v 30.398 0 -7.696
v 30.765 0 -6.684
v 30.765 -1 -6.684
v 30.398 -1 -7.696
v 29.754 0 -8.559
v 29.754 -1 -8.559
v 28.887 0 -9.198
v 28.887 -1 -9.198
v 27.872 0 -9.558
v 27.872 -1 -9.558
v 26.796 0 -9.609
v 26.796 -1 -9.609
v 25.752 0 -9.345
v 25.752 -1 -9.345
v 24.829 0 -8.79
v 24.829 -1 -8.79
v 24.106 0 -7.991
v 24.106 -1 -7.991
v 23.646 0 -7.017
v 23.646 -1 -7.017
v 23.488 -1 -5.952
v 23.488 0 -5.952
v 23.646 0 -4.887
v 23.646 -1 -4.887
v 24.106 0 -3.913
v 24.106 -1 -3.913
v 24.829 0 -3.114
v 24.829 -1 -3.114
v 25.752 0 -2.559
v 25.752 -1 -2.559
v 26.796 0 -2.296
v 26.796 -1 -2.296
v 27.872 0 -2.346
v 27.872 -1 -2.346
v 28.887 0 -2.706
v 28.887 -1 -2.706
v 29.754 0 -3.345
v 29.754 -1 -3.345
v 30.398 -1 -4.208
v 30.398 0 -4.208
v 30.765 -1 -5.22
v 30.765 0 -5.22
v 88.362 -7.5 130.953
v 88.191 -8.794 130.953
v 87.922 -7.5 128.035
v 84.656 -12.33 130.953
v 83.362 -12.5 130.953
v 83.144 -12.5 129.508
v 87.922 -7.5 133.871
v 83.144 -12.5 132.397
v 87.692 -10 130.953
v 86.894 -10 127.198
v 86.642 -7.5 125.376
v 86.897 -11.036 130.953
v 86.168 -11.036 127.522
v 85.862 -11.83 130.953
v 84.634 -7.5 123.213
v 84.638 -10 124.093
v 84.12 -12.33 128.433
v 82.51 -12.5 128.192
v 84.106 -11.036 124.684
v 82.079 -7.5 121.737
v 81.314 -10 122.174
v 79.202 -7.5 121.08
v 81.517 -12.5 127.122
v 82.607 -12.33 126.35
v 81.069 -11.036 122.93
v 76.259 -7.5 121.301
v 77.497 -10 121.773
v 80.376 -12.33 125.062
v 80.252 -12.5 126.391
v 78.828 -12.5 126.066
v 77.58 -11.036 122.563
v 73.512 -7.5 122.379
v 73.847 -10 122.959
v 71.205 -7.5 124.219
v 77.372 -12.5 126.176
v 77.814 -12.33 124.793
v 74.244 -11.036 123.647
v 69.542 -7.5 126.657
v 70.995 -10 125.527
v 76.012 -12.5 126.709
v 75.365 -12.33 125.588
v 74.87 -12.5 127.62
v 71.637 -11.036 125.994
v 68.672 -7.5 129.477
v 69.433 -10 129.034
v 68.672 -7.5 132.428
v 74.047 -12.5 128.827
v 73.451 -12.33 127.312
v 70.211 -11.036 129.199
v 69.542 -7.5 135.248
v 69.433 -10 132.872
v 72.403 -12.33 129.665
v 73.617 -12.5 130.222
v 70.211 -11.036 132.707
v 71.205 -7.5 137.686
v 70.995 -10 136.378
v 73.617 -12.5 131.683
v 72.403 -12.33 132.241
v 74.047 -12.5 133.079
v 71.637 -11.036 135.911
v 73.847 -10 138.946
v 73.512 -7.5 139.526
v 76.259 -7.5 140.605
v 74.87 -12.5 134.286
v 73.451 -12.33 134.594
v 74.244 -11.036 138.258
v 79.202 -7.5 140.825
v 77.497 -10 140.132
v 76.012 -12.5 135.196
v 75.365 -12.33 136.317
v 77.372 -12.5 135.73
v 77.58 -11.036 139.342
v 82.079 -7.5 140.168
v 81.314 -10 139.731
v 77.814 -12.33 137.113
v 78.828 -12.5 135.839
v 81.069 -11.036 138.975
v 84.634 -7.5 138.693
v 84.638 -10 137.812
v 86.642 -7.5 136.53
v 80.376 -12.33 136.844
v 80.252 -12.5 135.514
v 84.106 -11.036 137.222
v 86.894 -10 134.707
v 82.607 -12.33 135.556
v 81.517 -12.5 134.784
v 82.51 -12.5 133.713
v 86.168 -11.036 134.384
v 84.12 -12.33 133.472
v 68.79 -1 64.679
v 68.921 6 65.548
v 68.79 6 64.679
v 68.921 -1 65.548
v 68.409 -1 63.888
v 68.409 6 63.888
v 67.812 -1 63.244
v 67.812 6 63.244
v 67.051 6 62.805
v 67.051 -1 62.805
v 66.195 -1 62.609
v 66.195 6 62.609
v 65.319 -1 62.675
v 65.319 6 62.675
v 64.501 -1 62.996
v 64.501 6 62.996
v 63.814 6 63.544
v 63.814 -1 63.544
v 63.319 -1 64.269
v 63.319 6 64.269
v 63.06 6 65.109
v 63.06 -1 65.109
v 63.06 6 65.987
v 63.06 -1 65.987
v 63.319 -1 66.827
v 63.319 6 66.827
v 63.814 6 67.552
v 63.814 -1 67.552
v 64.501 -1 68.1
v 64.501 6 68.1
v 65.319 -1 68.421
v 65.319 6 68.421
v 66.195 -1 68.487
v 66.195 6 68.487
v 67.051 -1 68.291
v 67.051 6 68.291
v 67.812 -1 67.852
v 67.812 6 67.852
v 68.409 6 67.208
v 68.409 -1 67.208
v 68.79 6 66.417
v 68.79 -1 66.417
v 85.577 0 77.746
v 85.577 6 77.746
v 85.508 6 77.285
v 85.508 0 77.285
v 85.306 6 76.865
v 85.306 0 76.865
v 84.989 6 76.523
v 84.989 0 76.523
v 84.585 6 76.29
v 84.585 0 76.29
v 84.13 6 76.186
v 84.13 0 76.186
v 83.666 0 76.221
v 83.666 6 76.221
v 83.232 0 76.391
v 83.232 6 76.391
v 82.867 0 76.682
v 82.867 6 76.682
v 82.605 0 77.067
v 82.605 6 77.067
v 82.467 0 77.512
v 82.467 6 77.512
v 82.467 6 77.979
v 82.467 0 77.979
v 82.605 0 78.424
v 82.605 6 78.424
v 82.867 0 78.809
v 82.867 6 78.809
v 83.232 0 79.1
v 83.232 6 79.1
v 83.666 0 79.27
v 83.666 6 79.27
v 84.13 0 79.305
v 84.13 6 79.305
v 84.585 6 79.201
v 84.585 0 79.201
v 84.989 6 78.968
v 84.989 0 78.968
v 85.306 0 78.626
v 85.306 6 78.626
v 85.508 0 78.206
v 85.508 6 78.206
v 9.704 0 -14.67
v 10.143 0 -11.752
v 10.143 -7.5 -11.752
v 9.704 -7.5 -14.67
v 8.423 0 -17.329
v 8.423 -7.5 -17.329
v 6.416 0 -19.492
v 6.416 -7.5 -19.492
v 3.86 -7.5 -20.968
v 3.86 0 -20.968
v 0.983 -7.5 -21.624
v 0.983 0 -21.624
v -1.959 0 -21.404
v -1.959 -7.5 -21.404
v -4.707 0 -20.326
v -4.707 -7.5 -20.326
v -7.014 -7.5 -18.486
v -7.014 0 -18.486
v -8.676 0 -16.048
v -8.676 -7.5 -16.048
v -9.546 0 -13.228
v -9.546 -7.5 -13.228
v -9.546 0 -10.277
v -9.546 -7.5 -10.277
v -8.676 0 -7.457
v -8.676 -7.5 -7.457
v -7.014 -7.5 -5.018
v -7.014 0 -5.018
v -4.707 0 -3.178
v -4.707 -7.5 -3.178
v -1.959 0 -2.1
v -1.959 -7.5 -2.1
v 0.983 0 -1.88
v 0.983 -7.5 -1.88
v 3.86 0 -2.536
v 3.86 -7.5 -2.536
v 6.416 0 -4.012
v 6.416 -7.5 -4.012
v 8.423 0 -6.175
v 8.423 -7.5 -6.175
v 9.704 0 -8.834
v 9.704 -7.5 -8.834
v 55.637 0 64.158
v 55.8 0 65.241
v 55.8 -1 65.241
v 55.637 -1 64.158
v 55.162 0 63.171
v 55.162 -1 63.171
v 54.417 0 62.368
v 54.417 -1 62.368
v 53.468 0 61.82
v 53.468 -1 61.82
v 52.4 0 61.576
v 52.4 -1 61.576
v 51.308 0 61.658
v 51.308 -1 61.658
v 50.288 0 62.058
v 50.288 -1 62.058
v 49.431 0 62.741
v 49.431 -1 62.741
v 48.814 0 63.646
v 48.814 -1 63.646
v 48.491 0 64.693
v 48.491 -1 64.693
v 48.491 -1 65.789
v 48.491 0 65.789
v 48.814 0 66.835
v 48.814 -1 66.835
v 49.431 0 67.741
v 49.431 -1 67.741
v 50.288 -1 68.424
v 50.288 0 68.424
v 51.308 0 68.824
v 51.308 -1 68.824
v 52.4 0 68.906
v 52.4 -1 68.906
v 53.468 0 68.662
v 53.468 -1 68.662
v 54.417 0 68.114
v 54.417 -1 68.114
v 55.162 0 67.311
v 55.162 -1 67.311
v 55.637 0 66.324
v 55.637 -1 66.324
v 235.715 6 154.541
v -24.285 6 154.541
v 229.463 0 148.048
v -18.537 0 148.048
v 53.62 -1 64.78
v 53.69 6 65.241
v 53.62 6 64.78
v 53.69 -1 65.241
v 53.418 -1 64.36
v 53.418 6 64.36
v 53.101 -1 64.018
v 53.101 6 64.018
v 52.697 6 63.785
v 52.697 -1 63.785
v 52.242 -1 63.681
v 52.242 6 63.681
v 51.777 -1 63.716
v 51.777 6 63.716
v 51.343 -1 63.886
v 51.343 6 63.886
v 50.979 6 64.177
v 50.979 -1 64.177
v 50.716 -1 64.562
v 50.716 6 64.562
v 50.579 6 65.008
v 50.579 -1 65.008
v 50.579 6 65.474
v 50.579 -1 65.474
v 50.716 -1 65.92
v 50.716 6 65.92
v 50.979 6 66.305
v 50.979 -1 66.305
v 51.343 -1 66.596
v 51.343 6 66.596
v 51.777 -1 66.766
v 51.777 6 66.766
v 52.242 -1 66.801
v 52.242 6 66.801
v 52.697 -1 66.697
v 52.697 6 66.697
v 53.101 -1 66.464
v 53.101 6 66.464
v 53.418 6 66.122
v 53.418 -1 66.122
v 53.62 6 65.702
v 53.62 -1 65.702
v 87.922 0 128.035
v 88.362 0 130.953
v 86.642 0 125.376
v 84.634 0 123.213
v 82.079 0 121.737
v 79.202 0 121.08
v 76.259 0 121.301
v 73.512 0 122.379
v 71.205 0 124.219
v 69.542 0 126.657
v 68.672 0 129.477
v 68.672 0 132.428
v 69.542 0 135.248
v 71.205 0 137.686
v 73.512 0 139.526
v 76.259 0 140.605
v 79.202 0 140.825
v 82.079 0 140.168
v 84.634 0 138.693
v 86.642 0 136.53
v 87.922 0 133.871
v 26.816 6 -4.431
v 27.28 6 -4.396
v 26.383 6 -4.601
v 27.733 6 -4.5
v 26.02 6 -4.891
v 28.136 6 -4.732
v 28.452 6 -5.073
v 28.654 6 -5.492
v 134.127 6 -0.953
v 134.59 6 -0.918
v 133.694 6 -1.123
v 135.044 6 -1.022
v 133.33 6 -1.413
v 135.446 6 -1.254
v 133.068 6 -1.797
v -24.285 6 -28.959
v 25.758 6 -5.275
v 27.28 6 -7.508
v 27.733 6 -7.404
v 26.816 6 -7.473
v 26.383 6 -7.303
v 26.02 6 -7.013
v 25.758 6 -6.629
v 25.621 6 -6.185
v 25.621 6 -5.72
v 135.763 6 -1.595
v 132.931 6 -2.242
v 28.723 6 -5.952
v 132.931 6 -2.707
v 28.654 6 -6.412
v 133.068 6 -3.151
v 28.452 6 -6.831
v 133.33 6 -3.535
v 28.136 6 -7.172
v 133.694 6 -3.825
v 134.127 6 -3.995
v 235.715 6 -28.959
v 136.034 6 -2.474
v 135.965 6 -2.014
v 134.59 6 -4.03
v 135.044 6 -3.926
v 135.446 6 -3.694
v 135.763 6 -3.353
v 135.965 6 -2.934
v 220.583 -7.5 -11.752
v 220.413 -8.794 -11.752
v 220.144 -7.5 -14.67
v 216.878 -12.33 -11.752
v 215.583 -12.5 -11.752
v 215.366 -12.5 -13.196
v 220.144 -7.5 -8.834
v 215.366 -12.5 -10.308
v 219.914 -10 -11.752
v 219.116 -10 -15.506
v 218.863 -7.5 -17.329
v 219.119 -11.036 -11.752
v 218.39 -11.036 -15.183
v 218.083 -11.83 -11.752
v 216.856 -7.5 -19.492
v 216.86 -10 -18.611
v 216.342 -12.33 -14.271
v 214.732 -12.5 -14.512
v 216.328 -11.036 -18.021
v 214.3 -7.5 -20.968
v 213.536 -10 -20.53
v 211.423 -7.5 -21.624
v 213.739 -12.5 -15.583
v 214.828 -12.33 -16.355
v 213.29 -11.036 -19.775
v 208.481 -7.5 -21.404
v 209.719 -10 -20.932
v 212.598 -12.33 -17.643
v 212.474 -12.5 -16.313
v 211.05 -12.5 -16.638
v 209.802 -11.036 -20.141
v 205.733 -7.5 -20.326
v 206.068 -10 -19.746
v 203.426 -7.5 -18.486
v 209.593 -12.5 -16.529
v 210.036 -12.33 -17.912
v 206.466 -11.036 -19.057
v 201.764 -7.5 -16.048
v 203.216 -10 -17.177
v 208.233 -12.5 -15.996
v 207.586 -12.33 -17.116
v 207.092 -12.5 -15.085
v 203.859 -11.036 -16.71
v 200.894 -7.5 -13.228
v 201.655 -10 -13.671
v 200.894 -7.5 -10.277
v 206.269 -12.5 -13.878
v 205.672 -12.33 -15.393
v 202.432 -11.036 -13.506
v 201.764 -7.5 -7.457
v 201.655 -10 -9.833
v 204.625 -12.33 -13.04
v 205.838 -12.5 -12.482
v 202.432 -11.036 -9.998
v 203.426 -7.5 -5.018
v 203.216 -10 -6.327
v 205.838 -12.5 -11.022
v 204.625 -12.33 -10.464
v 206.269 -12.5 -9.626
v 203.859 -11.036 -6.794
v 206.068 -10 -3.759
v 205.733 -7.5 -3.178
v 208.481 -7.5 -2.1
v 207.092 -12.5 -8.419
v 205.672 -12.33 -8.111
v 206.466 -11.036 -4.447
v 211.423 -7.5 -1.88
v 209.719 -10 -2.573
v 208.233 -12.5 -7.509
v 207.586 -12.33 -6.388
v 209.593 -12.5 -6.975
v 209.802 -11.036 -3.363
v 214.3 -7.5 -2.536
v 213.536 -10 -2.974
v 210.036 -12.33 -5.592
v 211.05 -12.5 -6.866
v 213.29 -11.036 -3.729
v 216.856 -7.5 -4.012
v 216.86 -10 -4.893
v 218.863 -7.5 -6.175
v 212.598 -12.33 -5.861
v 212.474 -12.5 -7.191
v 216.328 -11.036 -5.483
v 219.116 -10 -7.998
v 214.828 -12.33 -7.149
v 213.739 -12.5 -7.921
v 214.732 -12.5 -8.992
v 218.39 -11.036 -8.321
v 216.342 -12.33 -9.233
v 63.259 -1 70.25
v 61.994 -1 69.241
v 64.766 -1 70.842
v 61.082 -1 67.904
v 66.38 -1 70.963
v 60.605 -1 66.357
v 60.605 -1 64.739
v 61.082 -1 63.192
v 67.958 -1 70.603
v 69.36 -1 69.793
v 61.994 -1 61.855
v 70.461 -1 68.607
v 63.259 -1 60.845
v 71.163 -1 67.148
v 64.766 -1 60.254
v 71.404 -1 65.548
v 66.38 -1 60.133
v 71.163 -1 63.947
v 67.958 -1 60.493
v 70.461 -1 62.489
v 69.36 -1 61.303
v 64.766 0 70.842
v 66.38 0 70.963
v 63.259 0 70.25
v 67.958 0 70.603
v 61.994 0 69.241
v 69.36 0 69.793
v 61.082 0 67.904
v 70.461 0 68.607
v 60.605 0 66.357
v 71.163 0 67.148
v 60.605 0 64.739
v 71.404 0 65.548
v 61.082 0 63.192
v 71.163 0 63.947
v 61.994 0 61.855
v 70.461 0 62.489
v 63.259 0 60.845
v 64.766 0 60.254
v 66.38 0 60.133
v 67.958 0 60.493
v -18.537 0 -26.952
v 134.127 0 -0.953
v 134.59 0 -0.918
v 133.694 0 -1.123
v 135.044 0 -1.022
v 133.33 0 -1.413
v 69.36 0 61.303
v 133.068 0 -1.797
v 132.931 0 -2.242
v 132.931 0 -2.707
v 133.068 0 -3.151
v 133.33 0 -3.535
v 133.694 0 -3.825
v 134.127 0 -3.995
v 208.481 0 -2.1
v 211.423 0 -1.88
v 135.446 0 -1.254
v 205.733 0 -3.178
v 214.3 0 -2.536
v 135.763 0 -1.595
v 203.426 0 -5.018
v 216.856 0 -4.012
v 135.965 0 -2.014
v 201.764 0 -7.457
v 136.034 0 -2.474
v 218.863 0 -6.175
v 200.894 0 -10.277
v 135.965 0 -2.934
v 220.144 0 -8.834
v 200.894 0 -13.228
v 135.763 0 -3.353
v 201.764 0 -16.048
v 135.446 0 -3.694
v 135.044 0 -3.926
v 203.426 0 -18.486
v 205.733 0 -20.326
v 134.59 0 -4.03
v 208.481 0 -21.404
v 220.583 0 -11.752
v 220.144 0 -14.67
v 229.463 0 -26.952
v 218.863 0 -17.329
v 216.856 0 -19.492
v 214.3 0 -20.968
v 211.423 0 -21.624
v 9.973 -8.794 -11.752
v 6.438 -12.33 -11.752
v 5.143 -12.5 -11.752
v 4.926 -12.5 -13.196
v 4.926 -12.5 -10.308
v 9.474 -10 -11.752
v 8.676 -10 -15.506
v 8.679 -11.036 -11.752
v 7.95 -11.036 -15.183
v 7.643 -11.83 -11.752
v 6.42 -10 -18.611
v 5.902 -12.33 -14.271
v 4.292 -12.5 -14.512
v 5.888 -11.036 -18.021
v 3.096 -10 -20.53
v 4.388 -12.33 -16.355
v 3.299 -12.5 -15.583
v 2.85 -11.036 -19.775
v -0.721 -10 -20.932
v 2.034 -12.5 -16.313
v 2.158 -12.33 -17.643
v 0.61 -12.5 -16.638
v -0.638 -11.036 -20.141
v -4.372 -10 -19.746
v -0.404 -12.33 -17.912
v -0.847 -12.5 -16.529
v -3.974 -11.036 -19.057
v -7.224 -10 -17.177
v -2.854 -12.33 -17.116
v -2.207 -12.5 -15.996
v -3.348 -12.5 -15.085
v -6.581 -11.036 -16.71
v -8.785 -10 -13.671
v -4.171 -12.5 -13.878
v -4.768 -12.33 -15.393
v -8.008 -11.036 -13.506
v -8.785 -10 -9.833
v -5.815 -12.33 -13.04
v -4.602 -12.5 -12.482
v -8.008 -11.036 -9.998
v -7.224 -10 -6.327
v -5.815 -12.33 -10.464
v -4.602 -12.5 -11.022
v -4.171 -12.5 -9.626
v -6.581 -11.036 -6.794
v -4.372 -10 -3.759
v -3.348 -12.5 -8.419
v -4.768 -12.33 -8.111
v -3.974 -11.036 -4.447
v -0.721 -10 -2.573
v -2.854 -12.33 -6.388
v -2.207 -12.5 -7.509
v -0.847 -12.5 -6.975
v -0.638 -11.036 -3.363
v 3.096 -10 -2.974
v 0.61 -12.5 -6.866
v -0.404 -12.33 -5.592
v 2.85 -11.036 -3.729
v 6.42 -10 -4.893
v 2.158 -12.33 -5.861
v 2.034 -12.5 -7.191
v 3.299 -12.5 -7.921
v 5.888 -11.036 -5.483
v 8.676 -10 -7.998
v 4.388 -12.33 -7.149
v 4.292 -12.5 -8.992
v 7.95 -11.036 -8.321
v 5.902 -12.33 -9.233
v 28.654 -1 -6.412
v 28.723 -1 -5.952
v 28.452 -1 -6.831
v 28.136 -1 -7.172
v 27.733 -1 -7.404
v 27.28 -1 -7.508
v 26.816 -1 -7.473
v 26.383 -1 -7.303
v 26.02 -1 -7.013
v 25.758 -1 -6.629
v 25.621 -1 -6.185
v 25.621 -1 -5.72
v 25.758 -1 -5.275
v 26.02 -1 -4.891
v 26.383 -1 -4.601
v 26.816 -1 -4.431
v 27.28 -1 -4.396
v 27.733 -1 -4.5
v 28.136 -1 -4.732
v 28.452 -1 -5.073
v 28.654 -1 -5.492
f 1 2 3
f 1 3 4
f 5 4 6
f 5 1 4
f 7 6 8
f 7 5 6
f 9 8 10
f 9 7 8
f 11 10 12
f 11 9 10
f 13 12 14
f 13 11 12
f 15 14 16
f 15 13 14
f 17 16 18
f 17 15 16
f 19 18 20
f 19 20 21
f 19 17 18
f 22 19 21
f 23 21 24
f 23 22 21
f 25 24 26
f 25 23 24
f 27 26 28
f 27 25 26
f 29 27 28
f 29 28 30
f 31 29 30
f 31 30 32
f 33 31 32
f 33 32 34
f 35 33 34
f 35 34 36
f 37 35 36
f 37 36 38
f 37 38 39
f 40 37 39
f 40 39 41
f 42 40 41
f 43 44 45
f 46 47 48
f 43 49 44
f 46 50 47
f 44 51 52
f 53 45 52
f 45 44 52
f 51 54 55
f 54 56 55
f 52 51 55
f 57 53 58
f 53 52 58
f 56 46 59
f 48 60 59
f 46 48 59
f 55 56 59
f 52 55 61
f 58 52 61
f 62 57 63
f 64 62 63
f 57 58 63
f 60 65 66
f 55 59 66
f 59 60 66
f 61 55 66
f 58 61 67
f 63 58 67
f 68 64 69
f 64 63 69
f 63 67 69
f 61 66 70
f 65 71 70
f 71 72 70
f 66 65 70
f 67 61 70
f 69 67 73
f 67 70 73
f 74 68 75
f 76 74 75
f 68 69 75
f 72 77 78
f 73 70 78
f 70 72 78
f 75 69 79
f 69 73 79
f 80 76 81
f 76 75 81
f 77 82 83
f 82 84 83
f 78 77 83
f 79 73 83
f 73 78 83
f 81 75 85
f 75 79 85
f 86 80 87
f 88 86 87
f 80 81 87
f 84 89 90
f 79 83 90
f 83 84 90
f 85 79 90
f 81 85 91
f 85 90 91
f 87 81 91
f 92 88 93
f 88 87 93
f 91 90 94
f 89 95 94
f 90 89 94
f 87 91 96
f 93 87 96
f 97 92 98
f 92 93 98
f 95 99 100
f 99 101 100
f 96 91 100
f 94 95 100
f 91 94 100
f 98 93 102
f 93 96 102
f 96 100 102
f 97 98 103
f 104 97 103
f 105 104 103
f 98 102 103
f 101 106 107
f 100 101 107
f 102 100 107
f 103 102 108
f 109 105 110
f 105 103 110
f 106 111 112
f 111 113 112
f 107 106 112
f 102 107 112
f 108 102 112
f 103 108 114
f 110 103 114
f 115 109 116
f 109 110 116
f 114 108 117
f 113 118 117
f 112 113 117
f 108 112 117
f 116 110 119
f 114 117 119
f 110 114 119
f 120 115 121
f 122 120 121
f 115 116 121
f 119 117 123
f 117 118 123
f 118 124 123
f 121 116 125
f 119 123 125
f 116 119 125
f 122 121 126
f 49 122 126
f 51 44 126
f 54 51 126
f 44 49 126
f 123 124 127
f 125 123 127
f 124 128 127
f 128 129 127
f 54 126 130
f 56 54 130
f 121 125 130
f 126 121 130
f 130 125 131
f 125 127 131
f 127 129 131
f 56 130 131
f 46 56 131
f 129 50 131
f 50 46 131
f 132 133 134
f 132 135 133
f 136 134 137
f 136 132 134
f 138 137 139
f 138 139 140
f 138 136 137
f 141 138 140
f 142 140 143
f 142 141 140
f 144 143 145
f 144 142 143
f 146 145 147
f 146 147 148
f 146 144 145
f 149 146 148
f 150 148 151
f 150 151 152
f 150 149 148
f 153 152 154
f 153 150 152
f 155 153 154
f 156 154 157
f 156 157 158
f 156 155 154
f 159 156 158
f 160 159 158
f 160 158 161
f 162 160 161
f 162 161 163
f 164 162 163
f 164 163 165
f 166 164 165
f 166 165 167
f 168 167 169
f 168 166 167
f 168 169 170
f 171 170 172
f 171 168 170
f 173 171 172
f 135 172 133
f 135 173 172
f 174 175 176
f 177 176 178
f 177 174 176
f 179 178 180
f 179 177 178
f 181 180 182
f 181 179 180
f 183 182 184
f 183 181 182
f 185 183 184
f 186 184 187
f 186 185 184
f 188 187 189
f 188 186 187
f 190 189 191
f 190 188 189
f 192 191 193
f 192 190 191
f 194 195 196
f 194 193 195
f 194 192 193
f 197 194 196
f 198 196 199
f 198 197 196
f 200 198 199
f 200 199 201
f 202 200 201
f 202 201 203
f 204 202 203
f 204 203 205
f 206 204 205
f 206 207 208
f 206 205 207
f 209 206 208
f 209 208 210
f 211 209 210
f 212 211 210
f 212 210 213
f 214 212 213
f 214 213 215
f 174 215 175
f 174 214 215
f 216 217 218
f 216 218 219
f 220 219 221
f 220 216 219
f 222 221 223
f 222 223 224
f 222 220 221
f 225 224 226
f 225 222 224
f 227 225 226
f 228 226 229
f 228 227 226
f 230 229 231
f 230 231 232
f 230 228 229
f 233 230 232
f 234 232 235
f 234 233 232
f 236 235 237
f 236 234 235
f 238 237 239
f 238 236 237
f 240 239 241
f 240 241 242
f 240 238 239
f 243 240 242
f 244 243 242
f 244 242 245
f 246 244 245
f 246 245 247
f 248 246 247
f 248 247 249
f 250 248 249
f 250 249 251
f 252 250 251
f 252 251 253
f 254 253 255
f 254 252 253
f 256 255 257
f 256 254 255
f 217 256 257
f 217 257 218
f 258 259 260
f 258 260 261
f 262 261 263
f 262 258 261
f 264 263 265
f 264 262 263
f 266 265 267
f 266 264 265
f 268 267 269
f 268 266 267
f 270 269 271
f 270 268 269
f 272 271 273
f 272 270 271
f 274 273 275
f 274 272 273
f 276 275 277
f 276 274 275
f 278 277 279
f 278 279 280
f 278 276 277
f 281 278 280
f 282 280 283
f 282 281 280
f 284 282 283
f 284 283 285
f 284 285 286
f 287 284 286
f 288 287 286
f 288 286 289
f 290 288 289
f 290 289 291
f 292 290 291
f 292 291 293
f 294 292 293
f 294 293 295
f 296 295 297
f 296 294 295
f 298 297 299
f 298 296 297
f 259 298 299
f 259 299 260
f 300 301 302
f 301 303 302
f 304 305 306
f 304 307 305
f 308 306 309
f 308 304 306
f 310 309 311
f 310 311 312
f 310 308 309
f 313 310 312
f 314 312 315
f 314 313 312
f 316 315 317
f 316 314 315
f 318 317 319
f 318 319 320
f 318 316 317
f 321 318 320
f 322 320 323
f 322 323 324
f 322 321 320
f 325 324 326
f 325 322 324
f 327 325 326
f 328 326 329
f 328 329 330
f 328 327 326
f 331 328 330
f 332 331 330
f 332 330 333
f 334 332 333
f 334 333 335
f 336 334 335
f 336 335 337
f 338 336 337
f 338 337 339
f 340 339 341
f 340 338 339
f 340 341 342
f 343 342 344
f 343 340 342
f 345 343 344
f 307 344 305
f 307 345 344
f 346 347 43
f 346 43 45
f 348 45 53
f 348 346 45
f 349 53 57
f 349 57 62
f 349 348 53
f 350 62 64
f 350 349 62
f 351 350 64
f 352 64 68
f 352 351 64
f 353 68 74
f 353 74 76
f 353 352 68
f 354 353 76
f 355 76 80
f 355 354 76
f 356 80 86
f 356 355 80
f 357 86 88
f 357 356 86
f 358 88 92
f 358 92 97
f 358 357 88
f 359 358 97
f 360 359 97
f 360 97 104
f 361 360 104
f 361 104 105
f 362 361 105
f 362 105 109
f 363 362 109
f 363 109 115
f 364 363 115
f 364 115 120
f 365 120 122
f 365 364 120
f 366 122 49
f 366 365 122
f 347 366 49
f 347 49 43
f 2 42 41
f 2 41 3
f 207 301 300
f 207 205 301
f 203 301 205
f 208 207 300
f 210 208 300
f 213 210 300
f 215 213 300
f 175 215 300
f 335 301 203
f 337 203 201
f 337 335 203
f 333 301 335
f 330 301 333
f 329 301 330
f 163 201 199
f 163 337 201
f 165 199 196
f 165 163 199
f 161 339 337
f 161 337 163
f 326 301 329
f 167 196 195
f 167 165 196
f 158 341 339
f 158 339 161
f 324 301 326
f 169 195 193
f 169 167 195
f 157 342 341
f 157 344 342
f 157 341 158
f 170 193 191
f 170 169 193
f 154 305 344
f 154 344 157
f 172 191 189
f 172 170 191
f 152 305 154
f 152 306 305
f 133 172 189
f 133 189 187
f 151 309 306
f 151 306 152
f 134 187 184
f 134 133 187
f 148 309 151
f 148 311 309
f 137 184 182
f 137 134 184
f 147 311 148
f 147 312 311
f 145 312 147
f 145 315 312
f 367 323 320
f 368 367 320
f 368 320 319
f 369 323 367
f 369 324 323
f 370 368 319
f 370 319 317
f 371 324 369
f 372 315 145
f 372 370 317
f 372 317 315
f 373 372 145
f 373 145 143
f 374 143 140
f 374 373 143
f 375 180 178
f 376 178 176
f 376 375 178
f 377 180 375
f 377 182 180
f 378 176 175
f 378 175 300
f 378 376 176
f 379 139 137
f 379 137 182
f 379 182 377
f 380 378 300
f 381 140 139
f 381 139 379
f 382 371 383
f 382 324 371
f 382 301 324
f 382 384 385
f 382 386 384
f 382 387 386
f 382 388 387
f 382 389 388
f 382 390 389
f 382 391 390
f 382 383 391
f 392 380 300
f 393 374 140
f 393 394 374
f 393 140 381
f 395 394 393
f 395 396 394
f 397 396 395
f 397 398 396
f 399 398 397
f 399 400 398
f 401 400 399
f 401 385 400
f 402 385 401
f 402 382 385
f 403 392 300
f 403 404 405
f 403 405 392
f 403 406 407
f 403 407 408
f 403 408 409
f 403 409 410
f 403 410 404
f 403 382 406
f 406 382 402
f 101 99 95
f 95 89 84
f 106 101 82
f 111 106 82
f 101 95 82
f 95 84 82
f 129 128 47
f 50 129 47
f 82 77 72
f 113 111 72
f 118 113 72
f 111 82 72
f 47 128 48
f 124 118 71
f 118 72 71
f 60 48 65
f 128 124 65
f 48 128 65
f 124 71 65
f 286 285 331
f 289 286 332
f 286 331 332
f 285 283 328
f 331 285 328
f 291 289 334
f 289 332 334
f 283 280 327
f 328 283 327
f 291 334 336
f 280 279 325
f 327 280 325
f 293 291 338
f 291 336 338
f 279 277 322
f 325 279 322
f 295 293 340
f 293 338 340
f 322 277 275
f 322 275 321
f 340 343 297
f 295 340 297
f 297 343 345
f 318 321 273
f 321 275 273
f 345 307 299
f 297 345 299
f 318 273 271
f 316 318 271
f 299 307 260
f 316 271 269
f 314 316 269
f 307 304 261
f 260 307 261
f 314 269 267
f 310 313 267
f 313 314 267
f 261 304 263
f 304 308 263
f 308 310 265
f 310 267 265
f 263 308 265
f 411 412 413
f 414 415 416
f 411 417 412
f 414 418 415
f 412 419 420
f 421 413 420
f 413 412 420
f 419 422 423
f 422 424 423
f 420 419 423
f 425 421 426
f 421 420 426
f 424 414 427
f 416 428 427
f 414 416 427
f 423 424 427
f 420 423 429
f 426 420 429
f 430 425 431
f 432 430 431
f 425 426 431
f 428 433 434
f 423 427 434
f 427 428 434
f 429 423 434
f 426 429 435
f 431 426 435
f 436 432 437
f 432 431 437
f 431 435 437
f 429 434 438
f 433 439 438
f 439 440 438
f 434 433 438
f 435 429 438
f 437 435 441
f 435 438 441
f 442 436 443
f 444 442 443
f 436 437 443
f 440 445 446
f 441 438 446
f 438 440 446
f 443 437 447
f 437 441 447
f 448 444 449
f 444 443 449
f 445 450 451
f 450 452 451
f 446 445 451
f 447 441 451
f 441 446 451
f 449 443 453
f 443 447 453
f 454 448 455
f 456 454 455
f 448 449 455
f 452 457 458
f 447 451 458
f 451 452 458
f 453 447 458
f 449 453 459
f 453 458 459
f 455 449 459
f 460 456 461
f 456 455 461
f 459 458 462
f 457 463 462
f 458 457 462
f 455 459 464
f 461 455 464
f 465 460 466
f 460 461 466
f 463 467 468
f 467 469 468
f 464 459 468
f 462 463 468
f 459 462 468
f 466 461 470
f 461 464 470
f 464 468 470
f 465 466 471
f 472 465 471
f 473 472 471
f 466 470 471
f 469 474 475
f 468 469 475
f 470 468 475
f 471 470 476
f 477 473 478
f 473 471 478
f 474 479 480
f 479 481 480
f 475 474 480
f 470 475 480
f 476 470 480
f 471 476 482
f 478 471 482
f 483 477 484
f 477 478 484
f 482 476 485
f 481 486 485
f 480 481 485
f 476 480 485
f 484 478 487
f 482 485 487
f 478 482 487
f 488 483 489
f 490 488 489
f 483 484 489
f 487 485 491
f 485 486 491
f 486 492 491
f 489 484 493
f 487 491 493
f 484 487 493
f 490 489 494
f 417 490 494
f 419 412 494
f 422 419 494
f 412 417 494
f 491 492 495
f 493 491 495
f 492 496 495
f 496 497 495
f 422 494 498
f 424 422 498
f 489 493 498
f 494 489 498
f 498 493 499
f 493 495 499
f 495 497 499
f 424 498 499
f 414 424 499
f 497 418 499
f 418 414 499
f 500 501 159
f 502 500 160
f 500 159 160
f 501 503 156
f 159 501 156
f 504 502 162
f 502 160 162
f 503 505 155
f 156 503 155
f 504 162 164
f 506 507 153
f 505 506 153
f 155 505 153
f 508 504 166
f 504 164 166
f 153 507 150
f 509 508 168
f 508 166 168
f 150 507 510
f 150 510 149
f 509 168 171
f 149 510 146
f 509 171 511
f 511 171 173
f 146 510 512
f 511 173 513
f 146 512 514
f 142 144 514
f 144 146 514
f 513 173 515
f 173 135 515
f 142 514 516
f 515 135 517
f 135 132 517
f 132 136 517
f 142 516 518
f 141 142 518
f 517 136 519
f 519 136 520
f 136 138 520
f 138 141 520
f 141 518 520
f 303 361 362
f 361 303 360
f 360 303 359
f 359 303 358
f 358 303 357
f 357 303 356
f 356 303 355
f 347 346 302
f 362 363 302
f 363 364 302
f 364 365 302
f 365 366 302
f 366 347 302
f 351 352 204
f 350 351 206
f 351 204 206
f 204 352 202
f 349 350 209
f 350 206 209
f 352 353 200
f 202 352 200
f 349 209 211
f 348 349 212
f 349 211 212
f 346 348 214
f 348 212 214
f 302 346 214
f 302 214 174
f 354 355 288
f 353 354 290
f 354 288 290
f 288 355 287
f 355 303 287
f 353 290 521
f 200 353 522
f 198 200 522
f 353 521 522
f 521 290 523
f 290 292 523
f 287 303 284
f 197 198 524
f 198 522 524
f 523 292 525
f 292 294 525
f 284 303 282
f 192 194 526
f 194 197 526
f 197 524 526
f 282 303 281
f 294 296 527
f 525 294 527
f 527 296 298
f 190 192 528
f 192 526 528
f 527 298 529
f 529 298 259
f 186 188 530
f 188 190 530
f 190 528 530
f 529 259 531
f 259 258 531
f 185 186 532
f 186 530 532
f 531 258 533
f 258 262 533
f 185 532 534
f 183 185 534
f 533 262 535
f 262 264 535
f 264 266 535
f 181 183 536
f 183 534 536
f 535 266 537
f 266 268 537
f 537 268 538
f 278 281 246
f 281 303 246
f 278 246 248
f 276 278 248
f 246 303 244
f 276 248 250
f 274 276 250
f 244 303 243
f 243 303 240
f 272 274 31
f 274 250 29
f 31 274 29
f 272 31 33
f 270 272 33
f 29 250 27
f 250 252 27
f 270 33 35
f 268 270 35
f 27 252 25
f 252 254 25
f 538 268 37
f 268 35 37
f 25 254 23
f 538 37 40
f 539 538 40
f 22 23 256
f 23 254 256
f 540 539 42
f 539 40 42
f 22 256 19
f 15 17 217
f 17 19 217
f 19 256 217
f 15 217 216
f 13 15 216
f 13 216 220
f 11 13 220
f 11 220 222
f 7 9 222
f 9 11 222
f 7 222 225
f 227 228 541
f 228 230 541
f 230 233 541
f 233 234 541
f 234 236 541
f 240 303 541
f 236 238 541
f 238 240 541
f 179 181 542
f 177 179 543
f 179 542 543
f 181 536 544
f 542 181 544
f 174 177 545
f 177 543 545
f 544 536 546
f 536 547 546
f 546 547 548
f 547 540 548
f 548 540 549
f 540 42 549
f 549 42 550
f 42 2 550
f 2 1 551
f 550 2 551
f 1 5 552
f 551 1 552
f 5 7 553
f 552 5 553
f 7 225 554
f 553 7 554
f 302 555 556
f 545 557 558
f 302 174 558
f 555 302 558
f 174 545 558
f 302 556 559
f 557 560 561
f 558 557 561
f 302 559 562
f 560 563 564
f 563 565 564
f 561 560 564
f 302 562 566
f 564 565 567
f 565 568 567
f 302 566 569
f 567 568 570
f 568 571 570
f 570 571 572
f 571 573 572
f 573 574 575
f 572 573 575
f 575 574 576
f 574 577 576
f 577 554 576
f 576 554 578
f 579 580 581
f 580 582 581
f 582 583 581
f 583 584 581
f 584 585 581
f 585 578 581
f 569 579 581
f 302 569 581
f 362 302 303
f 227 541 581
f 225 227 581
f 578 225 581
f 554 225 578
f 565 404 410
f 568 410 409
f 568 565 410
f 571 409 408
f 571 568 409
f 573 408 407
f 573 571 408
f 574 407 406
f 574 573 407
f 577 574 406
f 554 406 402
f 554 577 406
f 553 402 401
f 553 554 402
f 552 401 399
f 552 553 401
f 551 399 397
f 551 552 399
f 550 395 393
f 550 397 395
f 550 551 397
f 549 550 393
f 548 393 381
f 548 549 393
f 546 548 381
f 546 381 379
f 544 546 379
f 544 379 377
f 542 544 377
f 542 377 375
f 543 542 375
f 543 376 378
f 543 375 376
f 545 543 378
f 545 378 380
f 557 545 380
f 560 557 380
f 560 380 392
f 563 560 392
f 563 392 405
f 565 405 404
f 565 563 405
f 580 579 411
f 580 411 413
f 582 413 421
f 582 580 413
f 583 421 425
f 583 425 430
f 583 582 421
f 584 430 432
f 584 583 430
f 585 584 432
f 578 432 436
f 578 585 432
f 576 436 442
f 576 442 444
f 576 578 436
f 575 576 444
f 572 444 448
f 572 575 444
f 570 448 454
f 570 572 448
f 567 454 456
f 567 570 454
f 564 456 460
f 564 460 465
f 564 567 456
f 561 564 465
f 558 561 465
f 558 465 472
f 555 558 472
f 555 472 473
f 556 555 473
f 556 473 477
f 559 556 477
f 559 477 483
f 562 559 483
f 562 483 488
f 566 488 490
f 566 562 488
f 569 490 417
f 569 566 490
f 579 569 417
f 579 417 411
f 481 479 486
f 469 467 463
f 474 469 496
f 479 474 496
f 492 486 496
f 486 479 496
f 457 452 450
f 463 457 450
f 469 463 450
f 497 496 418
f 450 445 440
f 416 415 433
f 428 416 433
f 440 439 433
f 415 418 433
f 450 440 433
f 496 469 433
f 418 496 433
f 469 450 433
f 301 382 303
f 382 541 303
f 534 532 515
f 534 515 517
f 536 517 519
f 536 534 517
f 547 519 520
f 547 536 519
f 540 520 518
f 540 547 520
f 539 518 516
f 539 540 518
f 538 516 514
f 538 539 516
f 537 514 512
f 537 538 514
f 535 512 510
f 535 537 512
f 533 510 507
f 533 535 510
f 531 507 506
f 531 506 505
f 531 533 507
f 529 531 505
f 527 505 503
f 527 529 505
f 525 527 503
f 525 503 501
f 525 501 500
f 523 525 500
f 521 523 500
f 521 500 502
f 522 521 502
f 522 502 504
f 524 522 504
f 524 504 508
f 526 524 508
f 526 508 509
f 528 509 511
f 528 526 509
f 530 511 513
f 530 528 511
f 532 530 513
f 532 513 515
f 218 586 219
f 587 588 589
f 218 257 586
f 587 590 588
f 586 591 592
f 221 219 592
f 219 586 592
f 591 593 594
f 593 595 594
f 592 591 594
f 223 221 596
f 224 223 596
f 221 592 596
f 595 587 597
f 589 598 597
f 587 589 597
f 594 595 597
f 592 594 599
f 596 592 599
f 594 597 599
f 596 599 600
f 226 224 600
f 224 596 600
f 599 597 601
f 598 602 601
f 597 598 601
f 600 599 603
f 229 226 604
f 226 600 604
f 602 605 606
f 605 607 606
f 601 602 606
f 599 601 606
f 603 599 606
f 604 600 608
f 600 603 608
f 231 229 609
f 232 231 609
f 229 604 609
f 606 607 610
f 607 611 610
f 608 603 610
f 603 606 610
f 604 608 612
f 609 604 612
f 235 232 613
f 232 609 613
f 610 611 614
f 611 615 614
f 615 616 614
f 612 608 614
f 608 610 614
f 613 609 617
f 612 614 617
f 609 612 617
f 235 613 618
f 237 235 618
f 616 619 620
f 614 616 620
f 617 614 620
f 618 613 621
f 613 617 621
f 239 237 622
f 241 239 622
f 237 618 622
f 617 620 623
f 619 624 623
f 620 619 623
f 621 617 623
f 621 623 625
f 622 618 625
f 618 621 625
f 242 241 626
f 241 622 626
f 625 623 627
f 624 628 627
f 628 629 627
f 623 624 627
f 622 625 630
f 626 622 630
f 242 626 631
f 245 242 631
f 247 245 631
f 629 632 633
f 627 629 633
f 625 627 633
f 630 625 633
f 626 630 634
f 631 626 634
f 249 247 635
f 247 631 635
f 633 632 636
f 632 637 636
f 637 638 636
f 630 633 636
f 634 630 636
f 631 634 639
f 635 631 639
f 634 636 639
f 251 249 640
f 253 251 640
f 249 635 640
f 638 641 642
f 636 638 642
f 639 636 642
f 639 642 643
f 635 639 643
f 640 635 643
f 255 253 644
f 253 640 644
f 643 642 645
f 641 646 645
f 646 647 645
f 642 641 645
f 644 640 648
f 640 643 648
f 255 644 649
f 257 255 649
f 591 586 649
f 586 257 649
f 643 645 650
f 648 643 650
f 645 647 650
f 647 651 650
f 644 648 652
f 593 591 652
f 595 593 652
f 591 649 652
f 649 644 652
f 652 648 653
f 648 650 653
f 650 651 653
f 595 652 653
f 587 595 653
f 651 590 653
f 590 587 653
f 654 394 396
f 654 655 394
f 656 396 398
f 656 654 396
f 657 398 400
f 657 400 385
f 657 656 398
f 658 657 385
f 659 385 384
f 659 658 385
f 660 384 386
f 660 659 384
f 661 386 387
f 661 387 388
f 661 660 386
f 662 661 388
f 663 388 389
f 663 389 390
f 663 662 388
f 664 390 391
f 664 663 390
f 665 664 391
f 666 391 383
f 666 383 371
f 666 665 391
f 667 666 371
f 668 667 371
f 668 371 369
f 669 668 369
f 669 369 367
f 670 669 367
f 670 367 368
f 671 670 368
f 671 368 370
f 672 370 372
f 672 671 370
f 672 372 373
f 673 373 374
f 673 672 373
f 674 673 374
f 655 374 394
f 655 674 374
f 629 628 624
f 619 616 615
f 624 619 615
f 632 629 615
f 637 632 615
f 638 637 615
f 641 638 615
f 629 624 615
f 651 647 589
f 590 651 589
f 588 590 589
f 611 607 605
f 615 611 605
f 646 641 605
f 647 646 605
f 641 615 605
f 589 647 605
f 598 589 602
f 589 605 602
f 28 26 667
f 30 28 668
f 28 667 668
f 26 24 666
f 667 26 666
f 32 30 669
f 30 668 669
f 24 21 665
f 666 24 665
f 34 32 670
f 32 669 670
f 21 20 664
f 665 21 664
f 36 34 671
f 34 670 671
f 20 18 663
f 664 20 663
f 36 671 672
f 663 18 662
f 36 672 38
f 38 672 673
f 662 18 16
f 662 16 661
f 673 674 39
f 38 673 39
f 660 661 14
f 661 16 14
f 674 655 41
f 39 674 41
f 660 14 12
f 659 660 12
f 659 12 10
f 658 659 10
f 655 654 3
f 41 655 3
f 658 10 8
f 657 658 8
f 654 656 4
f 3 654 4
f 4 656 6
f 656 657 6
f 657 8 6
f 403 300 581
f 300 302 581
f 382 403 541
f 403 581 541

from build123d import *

# Parameters (mm, degrees)
SKETCH3_W           = 260
SKETCH3_H           = 183.5
SKETCH1_W           = 248
SKETCH1_H           = 175
SKETCH1_5_R         = 1.564169695
CUT_EXTRUDE1_DEPTH  = 6
SKETCH1_6_R         = 1.56
SKETCH1_6_R_2       = 2.946919111
CUT_EXTRUDE2_DEPTH  = 6
SKETCH1_7_R         = 1.56
SKETCH1_7_R_2       = 3.675
SKETCH1_7_R_3       = 1.564169695
SKETCH1_7_R_4       = 5.43
SKETCH1_7_R_5       = 2.946919111
BOSS_EXTRUDE2_DEPTH = 1
SKETCH1_9_R         = 1.56
CUT_EXTRUDE9_DEPTH  = 10
SKETCH1_10_R        = 1.563792904
CUT_EXTRUDE11_DEPTH = 10
SKETCH1_11_R        = 9.9
BOSS_EXTRUDE3_DEPTH = 12.5
FILLET1_R           = 5


with BuildPart() as part:
    # Sketch3 → Loft2 section 0
    with BuildSketch(Plane(origin=(0, 6, 0), x_dir=(1, 0, 0), z_dir=(0, 1, 0))):
        with Locations((105.714567309, -62.790792315)):
            Rectangle(SKETCH3_W, SKETCH3_H)
    # Sketch1 → Loft2 section 1
    with BuildSketch(Plane(origin=(0, 0, 0), x_dir=(1, 0, 0), z_dir=(0, 1, 0))):
        with Locations((105.463499551, -60.547933158)):
            Rectangle(SKETCH1_W, SKETCH1_H)
    loft()

    # Sketch1<5> → Cut-Extrude1 (cut)
    with BuildSketch(Plane(origin=(0, 0, 0), x_dir=(1, 0, 0), z_dir=(0, 1, 0))):
        with Locations((52.125403534, -65.240953474)):
            Circle(SKETCH1_5_R)
    extrude(amount=CUT_EXTRUDE1_DEPTH, mode=Mode.SUBTRACT)

    # Sketch1<6> → Cut-Extrude2 (cut)
    with BuildSketch(Plane(origin=(0, 0, 0), x_dir=(1, 0, 0), z_dir=(0, 1, 0))):
        with Locations((27.163499551, 5.952066842)):
            Circle(SKETCH1_6_R)
        with Locations((65.97433474, -65.547933158)):
            Circle(SKETCH1_6_R_2)
    extrude(amount=CUT_EXTRUDE2_DEPTH, mode=Mode.SUBTRACT)

    # Sketch1<7> → Boss-Extrude2 (add)
    with BuildSketch(Plane(origin=(0, 0, 0), x_dir=(1, 0, 0), z_dir=(0, 1, 0))):
        with BuildLine():
            ThreePointArc((30.764919641, 6.683776027), (23.488499551, 5.952066842), (30.764919641, 5.220357657))
            Line((30.764919641, 5.220357657), (30.764919641, 6.683776027))
        make_face()
        with Locations((27.163499551, 5.952066842)):
            Circle(SKETCH1_7_R, mode=Mode.SUBTRACT)
        with Locations((52.125403534, -65.240953474)):
            Circle(SKETCH1_7_R_2)
        with Locations((52.125403534, -65.240953474)):
            Circle(SKETCH1_7_R_3, mode=Mode.SUBTRACT)
        with Locations((65.97433474, -65.547933158)):
            Circle(SKETCH1_7_R_4)
        with Locations((65.97433474, -65.547933158)):
            Circle(SKETCH1_7_R_5, mode=Mode.SUBTRACT)
    extrude(amount=-BOSS_EXTRUDE2_DEPTH)

    # Sketch1<9> → Cut-Extrude9 (cut)
    with BuildSketch(Plane(origin=(0, 0, 0), x_dir=(1, 0, 0), z_dir=(0, 1, 0))):
        with Locations((134.473825947, 2.474049361)):
            Circle(SKETCH1_9_R)
    extrude(amount=CUT_EXTRUDE9_DEPTH, mode=Mode.SUBTRACT)

    # Sketch1<10> → Cut-Extrude11 (cut)
    with BuildSketch(Plane(origin=(0, 0, 0), x_dir=(1, 0, 0), z_dir=(0, 1, 0))):
        with Locations((84.013499551, -77.745508872)):
            Circle(SKETCH1_10_R)
    extrude(amount=CUT_EXTRUDE11_DEPTH, mode=Mode.SUBTRACT)

    # Sketch1<11> → Boss-Extrude3 (add)
    with BuildSketch(Plane(origin=(0, 0, 0), x_dir=(1, 0, 0), z_dir=(0, 1, 0))):
        with Locations((210.683499551, 11.752066842)):
            Circle(SKETCH1_11_R)
        with Locations((78.461853504, -130.95272229)):
            Circle(SKETCH1_11_R)
        with Locations((0.243499551, 11.752066842)):
            Circle(SKETCH1_11_R)
    extrude(amount=-BOSS_EXTRUDE3_DEPTH)

    # Fillet1
    fillet1_edges = [part.edges().sort_by_distance(p)[0] for p in [
        (200.783499551, -12.5, -11.752066842),
        (68.561853504, -12.5, 130.95272229),
        (-9.656500449, -12.5, -11.752066842),
    ]]
    fillet(fillet1_edges, radius=FILLET1_R)


solid = part.part
